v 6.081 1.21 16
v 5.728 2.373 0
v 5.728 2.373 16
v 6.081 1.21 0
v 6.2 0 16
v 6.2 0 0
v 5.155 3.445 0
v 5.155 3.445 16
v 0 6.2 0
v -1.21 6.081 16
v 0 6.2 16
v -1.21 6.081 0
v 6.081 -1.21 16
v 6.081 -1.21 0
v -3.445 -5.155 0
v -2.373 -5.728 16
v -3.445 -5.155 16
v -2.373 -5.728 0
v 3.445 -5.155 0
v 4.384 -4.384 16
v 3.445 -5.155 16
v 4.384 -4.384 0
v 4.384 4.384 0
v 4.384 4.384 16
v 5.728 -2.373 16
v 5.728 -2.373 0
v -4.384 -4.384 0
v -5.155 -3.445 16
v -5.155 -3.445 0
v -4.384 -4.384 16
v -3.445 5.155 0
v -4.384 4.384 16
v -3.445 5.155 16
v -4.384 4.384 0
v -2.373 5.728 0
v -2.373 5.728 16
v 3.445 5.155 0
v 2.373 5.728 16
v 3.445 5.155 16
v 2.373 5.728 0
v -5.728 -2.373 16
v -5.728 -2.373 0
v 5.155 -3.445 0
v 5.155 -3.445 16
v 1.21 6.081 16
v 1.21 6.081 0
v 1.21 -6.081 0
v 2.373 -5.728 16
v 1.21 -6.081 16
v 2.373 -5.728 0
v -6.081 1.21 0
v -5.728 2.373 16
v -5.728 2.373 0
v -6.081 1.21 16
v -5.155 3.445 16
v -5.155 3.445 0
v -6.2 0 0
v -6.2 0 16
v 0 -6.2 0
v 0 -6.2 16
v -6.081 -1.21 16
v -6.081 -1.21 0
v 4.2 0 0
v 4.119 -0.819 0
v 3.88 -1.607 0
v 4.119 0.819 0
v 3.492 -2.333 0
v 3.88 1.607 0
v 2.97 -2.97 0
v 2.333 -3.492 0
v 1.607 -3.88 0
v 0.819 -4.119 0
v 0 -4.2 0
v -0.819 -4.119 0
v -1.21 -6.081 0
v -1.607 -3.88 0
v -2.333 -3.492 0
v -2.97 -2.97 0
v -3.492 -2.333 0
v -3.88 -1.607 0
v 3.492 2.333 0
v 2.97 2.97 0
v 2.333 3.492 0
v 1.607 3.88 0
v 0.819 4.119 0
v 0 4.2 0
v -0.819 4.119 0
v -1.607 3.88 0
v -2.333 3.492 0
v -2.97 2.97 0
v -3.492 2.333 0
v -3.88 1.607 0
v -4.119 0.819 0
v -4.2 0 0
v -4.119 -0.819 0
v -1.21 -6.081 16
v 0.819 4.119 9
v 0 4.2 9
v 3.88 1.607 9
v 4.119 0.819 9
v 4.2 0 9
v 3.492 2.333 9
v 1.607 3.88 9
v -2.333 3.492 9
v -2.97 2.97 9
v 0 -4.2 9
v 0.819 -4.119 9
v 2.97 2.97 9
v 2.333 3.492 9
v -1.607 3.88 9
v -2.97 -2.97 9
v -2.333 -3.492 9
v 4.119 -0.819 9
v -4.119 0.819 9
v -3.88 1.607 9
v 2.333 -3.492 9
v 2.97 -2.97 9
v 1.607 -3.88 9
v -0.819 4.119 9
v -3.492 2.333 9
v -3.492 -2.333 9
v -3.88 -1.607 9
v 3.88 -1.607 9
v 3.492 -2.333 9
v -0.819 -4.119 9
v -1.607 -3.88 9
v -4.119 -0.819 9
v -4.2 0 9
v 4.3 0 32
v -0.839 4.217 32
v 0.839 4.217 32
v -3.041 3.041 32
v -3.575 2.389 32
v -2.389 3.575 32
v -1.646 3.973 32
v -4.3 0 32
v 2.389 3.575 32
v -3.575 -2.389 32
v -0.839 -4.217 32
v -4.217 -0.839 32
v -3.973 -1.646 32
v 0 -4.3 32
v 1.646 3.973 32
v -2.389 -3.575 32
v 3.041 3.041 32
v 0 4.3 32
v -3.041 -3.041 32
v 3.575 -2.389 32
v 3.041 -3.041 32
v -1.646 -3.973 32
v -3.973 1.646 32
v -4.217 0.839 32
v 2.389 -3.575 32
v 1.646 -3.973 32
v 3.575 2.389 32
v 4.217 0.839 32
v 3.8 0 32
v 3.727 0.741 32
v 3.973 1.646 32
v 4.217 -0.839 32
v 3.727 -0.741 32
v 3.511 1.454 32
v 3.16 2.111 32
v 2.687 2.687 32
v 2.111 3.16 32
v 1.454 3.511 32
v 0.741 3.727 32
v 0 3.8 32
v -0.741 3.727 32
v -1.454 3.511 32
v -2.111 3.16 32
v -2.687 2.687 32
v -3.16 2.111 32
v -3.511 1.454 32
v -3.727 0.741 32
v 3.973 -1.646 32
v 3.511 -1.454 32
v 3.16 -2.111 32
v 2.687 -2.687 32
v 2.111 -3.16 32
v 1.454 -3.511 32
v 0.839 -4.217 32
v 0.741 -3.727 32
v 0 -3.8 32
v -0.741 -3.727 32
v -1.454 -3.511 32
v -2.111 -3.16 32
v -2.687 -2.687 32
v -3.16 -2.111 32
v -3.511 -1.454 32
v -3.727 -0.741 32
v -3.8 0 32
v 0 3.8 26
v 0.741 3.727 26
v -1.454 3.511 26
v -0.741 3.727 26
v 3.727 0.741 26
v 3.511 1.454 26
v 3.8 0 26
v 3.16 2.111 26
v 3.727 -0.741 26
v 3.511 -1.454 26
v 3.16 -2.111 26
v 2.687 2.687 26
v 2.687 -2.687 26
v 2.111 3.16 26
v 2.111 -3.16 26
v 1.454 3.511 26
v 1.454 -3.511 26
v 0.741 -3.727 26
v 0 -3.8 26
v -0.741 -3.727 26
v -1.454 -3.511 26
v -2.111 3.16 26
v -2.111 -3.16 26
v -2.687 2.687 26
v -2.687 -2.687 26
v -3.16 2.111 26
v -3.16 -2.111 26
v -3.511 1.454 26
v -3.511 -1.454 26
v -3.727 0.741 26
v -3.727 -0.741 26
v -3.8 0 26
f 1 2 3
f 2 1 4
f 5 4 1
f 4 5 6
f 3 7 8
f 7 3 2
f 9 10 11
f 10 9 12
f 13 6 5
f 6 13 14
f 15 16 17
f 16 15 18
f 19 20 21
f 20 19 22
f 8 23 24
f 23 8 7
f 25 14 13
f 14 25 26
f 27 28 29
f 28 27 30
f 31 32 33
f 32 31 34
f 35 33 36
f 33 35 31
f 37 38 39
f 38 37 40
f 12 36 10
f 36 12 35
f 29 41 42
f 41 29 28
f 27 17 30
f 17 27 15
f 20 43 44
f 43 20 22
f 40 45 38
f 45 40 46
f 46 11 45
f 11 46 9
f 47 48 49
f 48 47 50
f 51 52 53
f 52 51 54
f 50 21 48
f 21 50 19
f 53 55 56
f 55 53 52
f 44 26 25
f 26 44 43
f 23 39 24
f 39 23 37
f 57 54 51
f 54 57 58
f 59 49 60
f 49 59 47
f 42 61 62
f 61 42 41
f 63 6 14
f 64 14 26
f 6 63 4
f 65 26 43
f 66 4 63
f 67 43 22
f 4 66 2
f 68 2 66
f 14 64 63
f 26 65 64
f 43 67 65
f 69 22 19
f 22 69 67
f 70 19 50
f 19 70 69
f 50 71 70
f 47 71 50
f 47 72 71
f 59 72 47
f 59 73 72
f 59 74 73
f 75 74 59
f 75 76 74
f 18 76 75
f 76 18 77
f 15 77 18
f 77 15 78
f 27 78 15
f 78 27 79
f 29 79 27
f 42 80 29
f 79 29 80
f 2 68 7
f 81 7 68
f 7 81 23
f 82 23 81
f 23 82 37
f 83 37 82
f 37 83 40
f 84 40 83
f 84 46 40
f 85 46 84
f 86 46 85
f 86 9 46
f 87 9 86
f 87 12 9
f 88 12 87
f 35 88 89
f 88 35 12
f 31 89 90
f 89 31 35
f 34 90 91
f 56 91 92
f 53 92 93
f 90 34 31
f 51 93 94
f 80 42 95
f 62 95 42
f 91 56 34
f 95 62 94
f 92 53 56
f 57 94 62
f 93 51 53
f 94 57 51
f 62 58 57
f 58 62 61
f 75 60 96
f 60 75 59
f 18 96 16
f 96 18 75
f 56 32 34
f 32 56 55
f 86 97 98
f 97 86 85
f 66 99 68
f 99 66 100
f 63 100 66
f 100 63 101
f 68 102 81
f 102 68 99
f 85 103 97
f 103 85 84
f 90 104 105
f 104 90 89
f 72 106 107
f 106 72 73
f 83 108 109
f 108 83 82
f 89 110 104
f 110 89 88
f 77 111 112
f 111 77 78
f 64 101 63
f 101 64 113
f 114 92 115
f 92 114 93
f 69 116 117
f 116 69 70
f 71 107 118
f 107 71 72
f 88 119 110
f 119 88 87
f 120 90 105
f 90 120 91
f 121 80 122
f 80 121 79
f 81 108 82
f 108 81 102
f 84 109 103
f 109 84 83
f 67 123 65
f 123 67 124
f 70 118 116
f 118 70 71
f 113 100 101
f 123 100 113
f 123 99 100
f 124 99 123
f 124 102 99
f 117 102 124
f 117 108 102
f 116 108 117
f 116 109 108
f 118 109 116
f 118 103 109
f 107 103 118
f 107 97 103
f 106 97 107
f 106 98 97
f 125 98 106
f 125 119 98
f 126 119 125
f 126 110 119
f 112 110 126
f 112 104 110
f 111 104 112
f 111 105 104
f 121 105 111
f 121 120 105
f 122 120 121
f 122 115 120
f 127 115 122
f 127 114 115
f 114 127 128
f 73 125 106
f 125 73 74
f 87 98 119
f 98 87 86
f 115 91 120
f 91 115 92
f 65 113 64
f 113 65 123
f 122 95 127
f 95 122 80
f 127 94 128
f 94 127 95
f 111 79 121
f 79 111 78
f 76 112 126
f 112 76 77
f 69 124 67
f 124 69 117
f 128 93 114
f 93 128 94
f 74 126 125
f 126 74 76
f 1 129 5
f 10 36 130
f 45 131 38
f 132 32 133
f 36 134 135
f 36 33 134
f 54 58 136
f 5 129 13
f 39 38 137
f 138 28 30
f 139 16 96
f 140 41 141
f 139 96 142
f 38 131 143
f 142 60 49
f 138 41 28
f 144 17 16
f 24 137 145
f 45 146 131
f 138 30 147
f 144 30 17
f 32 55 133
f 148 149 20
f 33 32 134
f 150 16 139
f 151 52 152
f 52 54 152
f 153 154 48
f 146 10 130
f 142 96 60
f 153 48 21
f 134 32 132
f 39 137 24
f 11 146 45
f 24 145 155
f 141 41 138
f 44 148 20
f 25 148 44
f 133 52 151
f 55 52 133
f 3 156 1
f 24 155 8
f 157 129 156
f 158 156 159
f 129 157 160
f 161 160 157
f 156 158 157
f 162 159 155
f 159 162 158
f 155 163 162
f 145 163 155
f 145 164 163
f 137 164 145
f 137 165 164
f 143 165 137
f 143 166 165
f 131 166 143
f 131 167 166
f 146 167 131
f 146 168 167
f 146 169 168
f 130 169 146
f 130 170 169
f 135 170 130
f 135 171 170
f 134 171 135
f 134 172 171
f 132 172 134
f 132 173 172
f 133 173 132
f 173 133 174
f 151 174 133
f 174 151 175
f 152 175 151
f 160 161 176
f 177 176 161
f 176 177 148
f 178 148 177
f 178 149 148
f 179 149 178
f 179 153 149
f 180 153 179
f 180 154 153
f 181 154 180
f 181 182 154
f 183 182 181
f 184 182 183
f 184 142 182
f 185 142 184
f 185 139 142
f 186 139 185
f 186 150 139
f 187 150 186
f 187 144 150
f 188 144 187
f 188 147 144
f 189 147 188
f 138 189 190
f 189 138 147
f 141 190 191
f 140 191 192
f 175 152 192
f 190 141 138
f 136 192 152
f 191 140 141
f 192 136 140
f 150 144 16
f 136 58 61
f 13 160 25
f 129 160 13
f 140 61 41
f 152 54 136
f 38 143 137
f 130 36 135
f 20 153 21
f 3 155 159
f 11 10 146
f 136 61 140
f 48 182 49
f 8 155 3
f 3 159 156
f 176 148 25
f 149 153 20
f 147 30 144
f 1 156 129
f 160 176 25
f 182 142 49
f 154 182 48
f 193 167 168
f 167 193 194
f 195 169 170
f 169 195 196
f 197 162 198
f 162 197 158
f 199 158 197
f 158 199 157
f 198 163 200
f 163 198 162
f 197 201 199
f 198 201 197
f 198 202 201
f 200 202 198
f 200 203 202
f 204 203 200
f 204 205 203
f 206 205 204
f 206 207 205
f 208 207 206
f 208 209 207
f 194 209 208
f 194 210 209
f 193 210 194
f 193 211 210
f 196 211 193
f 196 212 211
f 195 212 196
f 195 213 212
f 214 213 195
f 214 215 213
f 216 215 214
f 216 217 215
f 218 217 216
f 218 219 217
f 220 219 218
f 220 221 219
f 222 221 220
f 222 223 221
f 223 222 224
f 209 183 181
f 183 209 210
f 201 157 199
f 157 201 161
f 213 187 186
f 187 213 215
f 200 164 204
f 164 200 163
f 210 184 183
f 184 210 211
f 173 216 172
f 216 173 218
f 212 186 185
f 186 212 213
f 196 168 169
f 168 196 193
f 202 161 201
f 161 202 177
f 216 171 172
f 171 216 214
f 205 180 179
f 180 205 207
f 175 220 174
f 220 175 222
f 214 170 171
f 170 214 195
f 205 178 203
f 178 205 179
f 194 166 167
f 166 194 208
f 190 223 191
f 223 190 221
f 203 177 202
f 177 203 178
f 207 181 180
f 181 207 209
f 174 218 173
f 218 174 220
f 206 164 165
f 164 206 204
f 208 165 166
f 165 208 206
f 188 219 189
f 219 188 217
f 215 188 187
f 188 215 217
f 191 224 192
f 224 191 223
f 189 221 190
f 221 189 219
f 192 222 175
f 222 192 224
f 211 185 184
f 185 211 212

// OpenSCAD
//-- Parametric Traxxas 5347 carbon fiber rod connector
//-- Parametric: rod diameter can be adjusted as well as length and tolerance
//-- Assembly requires epoxy glue.
//-- AndrewBCN - Barcelona - March 2015
//-- GPLV3
//-- Please read the terms of the GPLV3 and please comply with it
//-- if remixing this part. Thank you.


// Parameters

// Rod diameter
Rod_diam=8; // [6:8]

// Part additional length
add_len=30; // [30:40]

// Print tolerance
tolerance=0.4; // [0.0,0.1,0.2,0.3,0.4]

/* [Hidden] */
$fn=32;

diam1=Rod_diam+tolerance;
diam2=diam1+4; // 2mm walls
diam3=7.2+tolerance; // Traxxas diameter
diam4=diam3+1;

// really simple code

// bottom
difference() {
  cylinder(r=diam2/2, h=add_len-14);
  translate([0,0,-0.1]) cylinder(r=diam1/2, h=9.1);
}
// top
difference() {
  translate([0,0,add_len-14]) cylinder(r1=diam2/2, r2=diam4/2, h=16);
  translate([0,0,add_len-4]) cylinder(r=diam3/2, h=8);
}
